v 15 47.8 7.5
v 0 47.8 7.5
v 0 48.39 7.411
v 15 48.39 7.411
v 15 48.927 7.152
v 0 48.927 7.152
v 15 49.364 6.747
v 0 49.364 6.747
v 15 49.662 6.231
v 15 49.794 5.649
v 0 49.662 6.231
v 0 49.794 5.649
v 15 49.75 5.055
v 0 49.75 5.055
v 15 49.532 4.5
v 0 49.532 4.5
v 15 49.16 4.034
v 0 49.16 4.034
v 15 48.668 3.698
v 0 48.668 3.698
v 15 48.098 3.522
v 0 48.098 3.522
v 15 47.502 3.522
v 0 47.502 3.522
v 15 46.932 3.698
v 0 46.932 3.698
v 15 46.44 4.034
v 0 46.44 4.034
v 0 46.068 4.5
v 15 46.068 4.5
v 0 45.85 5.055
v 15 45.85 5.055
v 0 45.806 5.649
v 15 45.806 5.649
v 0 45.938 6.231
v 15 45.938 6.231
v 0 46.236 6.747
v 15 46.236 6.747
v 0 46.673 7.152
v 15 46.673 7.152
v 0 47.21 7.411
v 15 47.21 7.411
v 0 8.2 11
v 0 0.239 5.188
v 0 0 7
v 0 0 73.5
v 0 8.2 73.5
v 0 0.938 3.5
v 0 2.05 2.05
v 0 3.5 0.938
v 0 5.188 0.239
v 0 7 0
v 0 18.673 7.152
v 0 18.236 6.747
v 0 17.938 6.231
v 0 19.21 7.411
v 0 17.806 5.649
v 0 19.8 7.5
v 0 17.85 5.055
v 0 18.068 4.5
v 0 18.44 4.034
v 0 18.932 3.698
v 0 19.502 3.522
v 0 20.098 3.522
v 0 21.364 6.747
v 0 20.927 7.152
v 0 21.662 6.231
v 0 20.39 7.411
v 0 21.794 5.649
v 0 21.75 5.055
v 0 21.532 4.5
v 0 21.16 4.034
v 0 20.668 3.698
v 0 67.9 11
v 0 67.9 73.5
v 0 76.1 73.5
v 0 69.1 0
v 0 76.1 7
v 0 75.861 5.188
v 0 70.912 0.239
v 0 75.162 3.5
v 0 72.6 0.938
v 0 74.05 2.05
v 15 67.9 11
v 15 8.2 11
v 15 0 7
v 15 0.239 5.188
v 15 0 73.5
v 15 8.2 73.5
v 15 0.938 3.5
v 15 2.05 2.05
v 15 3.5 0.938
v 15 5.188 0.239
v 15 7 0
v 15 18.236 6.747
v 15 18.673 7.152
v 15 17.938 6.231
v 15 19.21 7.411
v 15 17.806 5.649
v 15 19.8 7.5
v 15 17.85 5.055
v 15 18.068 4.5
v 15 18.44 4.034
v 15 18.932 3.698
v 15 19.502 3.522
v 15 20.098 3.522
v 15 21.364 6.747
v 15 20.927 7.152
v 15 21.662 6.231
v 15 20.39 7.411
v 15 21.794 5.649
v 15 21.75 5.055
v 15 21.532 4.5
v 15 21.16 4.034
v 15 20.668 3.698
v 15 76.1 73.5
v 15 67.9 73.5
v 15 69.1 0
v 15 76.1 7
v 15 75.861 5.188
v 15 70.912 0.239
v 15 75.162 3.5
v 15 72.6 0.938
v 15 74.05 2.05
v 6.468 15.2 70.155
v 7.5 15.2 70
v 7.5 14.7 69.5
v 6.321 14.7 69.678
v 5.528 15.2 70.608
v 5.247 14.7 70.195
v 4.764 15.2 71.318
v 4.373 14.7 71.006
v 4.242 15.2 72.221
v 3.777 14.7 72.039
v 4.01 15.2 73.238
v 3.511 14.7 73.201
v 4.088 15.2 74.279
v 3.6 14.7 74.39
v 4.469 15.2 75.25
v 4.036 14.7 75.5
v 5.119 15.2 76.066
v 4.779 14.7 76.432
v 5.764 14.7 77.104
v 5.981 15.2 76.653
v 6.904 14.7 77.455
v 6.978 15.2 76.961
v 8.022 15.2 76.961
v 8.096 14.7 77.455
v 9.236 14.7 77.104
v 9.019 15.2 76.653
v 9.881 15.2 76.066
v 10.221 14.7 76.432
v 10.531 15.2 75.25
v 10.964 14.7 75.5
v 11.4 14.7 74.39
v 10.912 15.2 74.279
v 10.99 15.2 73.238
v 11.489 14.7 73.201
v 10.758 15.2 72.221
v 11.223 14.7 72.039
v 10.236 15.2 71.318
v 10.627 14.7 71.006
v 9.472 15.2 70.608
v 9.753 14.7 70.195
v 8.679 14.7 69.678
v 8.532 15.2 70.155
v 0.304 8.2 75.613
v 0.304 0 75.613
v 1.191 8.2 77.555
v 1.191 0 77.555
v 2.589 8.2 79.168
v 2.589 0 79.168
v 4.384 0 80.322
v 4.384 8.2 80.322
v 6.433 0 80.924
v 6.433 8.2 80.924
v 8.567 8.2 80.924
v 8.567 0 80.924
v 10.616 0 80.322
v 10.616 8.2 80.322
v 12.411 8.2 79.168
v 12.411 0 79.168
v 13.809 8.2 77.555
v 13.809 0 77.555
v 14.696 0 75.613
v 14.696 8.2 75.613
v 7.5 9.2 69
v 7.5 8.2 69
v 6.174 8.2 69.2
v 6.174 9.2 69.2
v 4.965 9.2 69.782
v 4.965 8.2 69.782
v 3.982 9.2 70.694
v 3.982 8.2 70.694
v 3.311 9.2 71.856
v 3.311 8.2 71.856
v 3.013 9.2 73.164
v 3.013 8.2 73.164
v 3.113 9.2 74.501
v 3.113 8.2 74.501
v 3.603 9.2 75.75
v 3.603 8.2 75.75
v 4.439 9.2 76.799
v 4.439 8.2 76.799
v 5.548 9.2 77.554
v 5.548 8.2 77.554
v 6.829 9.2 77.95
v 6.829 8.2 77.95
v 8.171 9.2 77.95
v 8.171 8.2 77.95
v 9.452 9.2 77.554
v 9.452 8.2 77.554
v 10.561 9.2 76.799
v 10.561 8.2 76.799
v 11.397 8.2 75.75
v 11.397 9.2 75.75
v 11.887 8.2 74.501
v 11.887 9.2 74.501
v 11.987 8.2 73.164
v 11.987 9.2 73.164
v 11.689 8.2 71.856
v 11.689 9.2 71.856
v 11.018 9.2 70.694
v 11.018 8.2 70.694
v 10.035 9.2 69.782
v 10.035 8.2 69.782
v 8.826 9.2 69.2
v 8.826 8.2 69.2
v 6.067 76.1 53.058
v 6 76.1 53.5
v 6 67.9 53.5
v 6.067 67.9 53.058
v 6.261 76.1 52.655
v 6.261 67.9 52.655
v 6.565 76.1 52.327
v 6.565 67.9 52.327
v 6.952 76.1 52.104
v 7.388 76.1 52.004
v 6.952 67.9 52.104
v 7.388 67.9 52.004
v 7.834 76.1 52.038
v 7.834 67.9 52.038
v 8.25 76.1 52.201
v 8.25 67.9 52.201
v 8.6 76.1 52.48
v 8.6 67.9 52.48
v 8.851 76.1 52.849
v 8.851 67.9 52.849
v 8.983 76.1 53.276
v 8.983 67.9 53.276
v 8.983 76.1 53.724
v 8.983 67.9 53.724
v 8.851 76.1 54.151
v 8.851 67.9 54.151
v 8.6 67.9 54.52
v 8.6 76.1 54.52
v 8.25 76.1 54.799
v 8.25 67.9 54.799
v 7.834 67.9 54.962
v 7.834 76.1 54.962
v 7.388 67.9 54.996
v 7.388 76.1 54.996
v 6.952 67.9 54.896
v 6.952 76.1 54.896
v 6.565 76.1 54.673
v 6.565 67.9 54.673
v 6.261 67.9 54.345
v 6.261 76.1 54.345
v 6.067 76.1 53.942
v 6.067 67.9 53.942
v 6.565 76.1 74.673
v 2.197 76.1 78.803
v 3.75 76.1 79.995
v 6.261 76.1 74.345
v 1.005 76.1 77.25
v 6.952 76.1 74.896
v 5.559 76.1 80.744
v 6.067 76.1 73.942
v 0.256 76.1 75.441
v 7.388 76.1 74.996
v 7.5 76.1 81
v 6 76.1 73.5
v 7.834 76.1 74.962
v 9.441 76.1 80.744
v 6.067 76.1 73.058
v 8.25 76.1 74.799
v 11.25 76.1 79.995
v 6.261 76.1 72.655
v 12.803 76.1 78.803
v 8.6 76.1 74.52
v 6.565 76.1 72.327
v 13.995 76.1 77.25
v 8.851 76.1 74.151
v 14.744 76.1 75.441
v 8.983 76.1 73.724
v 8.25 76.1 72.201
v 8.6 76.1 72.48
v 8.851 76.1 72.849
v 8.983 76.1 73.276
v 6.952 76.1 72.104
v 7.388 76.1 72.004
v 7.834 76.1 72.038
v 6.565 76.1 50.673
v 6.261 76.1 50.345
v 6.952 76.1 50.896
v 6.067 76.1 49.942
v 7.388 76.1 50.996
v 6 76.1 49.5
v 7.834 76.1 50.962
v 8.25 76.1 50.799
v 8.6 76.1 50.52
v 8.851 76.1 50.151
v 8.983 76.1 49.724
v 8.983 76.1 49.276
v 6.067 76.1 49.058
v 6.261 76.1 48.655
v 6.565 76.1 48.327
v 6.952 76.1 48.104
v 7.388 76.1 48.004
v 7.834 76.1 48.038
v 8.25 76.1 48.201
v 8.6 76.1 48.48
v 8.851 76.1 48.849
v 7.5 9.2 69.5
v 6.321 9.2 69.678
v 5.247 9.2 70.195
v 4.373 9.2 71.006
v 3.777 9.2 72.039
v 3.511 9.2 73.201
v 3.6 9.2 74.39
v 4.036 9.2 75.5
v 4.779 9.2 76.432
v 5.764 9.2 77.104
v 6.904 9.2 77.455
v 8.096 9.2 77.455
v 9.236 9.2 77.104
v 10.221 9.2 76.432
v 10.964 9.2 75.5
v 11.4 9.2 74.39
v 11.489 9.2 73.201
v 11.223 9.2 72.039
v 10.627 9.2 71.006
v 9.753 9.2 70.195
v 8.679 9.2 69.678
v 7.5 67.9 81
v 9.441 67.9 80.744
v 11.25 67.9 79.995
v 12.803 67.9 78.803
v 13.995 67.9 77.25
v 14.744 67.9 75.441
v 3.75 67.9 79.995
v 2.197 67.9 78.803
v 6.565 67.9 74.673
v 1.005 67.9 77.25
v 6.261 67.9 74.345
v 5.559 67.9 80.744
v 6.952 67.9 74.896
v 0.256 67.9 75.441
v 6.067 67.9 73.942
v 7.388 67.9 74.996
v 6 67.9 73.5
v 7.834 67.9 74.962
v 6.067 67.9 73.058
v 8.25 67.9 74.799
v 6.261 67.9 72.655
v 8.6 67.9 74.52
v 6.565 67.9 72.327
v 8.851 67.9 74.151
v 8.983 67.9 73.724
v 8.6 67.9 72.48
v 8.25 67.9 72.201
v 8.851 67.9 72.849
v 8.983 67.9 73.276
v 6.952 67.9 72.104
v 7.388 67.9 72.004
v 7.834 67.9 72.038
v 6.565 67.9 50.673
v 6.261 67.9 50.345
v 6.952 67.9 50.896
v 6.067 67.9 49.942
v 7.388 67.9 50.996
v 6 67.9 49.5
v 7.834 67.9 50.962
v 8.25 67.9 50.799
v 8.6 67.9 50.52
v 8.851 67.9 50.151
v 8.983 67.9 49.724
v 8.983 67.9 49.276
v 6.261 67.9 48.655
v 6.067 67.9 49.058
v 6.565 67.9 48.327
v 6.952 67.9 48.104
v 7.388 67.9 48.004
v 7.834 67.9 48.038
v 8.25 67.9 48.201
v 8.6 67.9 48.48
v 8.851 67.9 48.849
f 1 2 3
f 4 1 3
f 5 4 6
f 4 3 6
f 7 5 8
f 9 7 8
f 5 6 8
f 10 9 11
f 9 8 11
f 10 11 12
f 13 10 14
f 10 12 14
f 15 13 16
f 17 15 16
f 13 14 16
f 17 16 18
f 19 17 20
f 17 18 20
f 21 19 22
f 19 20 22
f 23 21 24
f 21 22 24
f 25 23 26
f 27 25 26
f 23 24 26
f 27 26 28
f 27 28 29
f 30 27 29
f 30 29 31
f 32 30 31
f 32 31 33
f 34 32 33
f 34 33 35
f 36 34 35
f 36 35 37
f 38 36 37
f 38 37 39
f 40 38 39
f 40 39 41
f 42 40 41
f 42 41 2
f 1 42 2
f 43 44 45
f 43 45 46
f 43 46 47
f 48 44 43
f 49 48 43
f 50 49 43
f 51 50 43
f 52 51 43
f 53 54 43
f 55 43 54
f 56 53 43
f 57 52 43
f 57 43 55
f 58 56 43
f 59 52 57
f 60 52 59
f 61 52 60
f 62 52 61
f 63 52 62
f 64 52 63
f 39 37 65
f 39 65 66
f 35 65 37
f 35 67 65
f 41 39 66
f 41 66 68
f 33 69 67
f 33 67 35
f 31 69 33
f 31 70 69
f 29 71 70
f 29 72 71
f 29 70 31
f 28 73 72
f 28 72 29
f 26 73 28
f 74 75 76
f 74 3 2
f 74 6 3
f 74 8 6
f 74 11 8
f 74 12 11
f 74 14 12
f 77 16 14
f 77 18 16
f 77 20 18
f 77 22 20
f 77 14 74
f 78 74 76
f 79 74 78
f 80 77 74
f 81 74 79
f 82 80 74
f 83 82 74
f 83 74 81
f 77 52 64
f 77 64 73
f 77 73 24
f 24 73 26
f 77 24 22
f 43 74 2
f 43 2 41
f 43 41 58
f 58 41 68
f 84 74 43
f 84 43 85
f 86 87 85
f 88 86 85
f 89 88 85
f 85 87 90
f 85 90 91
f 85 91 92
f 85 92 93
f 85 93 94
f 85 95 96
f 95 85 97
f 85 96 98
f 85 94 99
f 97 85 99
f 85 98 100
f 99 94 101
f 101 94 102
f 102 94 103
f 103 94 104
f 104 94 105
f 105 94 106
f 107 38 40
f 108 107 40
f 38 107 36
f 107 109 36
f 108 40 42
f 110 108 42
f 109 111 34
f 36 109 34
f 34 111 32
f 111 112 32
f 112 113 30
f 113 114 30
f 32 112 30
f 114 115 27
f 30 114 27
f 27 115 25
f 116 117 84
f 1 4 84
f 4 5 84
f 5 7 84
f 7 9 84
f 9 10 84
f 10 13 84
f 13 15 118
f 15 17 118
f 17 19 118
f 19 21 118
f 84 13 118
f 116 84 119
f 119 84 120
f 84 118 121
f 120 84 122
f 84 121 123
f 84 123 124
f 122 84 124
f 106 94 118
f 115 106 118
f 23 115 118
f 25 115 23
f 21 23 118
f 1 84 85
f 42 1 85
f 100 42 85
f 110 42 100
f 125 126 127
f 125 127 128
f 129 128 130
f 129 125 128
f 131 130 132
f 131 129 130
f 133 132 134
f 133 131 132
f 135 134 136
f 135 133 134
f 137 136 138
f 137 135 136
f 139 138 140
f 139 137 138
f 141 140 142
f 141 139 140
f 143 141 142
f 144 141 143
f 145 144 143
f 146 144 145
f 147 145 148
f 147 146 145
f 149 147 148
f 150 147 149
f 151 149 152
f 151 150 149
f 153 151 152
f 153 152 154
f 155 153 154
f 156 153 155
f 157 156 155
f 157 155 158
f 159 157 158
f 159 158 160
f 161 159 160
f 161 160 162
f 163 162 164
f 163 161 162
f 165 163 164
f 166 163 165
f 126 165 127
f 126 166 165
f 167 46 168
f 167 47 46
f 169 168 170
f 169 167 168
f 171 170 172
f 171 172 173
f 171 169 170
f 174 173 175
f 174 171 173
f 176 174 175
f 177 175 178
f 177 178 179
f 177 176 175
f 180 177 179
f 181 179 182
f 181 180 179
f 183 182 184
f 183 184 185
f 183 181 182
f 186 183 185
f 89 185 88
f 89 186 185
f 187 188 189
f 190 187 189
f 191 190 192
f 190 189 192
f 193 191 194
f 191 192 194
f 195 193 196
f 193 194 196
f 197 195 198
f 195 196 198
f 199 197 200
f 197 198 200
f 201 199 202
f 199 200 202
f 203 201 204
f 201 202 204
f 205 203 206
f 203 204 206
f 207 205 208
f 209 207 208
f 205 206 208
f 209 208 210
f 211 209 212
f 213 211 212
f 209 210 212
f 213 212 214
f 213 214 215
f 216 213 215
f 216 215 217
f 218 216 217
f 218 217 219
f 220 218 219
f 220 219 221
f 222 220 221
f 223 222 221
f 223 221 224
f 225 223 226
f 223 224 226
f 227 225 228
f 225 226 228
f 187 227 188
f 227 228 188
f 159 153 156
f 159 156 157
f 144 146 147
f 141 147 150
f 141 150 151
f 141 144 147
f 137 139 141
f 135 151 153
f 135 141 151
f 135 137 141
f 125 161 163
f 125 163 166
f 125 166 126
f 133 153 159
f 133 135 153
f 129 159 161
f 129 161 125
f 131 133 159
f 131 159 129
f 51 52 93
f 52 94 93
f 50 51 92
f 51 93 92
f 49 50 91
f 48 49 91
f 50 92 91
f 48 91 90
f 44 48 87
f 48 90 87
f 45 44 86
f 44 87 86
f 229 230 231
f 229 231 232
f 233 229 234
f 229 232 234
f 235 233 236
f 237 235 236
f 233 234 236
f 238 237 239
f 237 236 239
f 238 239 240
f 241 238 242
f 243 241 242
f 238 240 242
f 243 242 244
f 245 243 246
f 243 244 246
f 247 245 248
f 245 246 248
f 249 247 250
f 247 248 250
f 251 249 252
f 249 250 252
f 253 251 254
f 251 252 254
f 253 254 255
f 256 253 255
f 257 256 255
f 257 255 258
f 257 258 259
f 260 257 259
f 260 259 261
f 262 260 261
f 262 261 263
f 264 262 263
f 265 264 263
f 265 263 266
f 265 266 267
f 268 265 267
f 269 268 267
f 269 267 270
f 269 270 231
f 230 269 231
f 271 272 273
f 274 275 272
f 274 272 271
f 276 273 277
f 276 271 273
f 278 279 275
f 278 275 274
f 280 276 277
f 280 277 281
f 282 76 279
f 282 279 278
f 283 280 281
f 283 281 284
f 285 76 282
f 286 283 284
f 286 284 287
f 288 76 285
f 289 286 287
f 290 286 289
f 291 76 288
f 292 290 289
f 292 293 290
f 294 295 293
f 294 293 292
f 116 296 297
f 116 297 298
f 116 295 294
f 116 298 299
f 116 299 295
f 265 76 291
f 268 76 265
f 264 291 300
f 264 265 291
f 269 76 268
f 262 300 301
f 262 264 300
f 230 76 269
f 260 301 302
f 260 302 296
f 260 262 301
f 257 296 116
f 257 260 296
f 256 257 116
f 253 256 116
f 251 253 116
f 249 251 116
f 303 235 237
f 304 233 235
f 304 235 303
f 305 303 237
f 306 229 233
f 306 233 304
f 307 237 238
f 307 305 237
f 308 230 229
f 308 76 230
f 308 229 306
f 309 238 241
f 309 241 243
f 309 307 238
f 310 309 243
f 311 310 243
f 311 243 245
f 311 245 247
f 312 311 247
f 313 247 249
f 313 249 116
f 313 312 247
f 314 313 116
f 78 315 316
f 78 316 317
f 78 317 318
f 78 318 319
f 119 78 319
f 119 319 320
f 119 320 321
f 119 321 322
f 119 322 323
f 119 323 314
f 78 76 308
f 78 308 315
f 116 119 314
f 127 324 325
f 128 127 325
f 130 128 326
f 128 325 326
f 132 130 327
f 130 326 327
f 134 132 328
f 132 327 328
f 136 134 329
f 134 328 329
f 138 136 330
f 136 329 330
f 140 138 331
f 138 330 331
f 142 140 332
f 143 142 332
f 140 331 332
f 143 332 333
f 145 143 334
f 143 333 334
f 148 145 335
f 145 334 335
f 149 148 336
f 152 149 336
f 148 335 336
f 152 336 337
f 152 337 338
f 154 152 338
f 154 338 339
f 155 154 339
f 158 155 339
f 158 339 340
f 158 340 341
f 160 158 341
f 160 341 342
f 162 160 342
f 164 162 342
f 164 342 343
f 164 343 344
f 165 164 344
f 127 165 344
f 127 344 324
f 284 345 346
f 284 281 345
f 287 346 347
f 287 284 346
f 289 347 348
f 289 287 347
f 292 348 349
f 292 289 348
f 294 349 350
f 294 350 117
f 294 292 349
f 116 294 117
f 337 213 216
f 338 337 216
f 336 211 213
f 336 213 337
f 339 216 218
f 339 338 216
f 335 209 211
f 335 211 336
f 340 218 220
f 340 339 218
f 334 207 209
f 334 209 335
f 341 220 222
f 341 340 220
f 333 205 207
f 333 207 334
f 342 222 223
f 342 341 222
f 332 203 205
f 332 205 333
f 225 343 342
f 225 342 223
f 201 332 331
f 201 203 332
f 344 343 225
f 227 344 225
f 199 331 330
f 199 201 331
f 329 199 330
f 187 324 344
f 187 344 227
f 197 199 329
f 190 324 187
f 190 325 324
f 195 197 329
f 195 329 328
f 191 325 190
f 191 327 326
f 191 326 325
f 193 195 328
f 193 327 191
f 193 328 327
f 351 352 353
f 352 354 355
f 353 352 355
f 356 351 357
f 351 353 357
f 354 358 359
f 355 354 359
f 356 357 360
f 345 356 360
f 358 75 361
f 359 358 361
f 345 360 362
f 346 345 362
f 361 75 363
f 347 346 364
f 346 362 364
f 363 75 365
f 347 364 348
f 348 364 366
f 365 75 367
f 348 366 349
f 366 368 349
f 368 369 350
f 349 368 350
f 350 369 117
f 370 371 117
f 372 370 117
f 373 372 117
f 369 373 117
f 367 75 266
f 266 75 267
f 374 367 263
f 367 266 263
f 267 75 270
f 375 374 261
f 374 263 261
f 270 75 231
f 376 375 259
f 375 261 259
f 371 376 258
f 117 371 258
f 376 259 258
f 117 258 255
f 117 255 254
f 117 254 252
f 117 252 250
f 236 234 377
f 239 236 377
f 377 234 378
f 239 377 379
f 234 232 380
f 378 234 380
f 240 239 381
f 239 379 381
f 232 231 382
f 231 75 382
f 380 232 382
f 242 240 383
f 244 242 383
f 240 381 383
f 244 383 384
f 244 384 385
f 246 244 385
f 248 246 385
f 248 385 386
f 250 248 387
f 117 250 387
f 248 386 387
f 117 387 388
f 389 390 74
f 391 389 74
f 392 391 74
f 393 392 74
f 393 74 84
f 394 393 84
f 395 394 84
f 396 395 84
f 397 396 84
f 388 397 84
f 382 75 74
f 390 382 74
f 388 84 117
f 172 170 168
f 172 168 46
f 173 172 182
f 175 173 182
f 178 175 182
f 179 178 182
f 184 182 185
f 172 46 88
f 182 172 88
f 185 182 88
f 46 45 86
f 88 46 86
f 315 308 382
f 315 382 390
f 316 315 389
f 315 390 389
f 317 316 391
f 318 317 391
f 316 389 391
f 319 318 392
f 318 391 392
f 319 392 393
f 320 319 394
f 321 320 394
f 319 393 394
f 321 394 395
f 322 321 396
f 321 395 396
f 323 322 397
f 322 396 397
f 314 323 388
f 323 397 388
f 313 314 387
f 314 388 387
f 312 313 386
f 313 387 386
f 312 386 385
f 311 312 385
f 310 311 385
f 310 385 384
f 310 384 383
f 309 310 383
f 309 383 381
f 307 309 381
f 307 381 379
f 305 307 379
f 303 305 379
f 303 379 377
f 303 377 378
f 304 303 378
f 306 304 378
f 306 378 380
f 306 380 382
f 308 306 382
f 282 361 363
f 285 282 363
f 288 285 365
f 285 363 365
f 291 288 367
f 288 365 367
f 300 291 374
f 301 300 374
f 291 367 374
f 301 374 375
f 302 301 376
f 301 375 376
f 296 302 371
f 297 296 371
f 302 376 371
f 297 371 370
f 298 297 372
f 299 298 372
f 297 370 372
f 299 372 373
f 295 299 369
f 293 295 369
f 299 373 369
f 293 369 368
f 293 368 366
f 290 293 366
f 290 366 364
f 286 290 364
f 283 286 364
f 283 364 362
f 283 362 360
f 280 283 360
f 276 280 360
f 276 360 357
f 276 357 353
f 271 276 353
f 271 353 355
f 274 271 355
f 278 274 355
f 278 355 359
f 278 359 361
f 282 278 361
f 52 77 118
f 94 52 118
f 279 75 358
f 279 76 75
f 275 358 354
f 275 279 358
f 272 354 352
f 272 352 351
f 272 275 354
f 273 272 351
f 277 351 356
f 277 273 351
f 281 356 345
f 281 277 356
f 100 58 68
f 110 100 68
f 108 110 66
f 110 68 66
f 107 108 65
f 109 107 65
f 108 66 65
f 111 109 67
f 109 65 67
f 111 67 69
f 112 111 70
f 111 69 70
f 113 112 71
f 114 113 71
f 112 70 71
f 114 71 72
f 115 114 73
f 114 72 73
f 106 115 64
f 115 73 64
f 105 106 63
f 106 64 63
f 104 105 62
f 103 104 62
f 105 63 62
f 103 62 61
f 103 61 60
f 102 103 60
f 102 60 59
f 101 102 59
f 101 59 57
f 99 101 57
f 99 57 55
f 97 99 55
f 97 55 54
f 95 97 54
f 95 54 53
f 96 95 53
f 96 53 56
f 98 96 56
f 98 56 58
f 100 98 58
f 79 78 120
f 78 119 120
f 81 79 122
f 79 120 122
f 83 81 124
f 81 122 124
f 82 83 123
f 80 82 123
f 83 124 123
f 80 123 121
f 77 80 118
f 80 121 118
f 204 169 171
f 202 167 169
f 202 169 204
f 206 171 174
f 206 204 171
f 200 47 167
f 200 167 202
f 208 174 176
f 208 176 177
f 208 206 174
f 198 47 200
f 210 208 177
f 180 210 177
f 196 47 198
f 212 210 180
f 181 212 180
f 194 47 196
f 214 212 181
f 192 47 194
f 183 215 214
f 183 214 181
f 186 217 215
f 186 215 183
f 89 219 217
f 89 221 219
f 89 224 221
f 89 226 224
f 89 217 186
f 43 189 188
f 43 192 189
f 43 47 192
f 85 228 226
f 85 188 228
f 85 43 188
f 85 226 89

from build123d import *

# Parameters (mm, degrees)
SCHIZZO1_W                   = 15
SCHIZZO1_H                   = 76.1
ESTRUSIONE_ESTRUSIONE1_DEPTH = 11
SCHIZZO2_W                   = 15
SCHIZZO2_H                   = 8.2
ESTRUSIONE_ESTRUSIONE2_DEPTH = 62.5
SCHIZZO3_R                   = 7.5
ESTRUSIONE_ESTRUSIONE3_DEPTH = 8.2
SCHIZZO4_R                   = 4
ESTRUSIONE_ESTRUSIONE4_DEPTH = 7
SMUSSO1_SIZE                 = 0.5
SCHIZZO5_W                   = 15
SCHIZZO5_H                   = 8.2
ESTRUSIONE_ESTRUSIONE5_DEPTH = 70
F_3_0_3_DIAMETER_HOLE1_D     = 3
F_3_0_3_DIAMETER_HOLE1_DEPTH = 10
F_3_0_3_DIAMETER_HOLE1_TIP   = 0.901290929
RACCORDO1_R                  = 7.5
RACCORDO2_R                  = 7
F_4_0_4_DIAMETER_HOLE1_D     = 4
SCHIZZO12_R                  = 4.5
ESTRUSIONE_ESTRUSIONE6_DEPTH = 1
F_3_0_3_DIAMETER_HOLE2_D     = 3
F_3_0_3_DIAMETER_HOLE2_DEPTH = 8.2


with BuildPart() as part:
    # Schizzo1 → Estrusione-Estrusione1 (new body)
    with BuildSketch(Plane.XY):
        with Locations((7.5, 38.05)):
            Rectangle(SCHIZZO1_W, SCHIZZO1_H)
    extrude(amount=ESTRUSIONE_ESTRUSIONE1_DEPTH)

    # Schizzo2 → Estrusione-Estrusione2 (add)
    with BuildSketch(Plane.XY.offset(11)):
        with Locations((7.5, 4.1)):
            Rectangle(SCHIZZO2_W, SCHIZZO2_H)
    extrude(amount=ESTRUSIONE_ESTRUSIONE2_DEPTH)

    # Schizzo3 → Estrusione-Estrusione3 (add)
    with BuildSketch(Plane(origin=(0, 8.2, 0), x_dir=(1, 0, 0), z_dir=(0, 1, 0))):
        with Locations((7.5, -73.5)):
            Circle(SCHIZZO3_R)
    extrude(amount=-ESTRUSIONE_ESTRUSIONE3_DEPTH)

    # Schizzo4 → Estrusione-Estrusione4 (add)
    with BuildSketch(Plane(origin=(0, 8.2, 0), x_dir=(1, 0, 0), z_dir=(0, 1, 0))):
        with Locations(Location((7.5, -73.5, 0), (0, 0, 90))):
            Circle(SCHIZZO4_R)
    extrude(amount=ESTRUSIONE_ESTRUSIONE4_DEPTH)

    # Smusso1
    smusso1_edges = [part.edges().sort_by_distance(p)[0] for p in [
        (7.5, 15.2, 77.5),
    ]]
    chamfer(smusso1_edges, length=SMUSSO1_SIZE)

    # Schizzo5 → Estrusione-Estrusione5 (add)
    with BuildSketch(Plane.XY.offset(11)):
        with Locations((7.5, 72)):
            Rectangle(SCHIZZO5_W, SCHIZZO5_H)
    extrude(amount=ESTRUSIONE_ESTRUSIONE5_DEPTH)

    # Ø3.0 (3) Diameter Hole1
    with Locations(Plane(origin=(0, 76.1, 0), x_dir=(1, 0, 0), z_dir=(0, 1, 0))):
        with Locations((7.5, -49.5), (7.5, -53.5)):
            Hole(F_3_0_3_DIAMETER_HOLE1_D / 2, depth=F_3_0_3_DIAMETER_HOLE1_DEPTH)
            with Locations((0, 0, -(F_3_0_3_DIAMETER_HOLE1_DEPTH + F_3_0_3_DIAMETER_HOLE1_TIP / 2))):  # 118° drill point
                Cone(0, F_3_0_3_DIAMETER_HOLE1_D / 2, F_3_0_3_DIAMETER_HOLE1_TIP, mode=Mode.SUBTRACT)

    # Raccordo1
    raccordo1_edges = [part.edges().sort_by_distance(p)[0] for p in [
        (15, 72, 81),
        (0, 72, 81),
    ]]
    fillet(raccordo1_edges, radius=RACCORDO1_R - 0.0001)  # a hair under: the kernel refuses the full size

    # Raccordo2
    raccordo2_edges = [part.edges().sort_by_distance(p)[0] for p in [
        (7.5, 76.1, 0),
        (7.5, 0, 0),
    ]]
    fillet(raccordo2_edges, radius=RACCORDO2_R)

    # Ø4.0 (4) Diameter Hole1 (through all)
    with Locations(Plane(origin=(15, 0, 0), x_dir=(0, 0, -1), z_dir=(1, 0, 0))):
        with Locations((-5.5, 19.8), (-5.5, 47.8)):
            Hole(F_4_0_4_DIAMETER_HOLE1_D / 2)

    # Schizzo12 → Estrusione-Estrusione6 (add)
    with BuildSketch(Plane(origin=(0, 8.2, 0), x_dir=(1, 0, 0), z_dir=(0, 1, 0))):
        with Locations(Location((7.5, -73.5, 0), (0, 0, 90))):
            Circle(SCHIZZO12_R)
    extrude(amount=ESTRUSIONE_ESTRUSIONE6_DEPTH)

    # Ø3.0 (3) Diameter Hole2
    with Locations(Plane(origin=(0, 76.1, 0), x_dir=(1, 0, 0), z_dir=(0, 1, 0))):
        with Locations((7.5, -73.5)):
            Hole(F_3_0_3_DIAMETER_HOLE2_D / 2, depth=F_3_0_3_DIAMETER_HOLE2_DEPTH)


solid = part.part
